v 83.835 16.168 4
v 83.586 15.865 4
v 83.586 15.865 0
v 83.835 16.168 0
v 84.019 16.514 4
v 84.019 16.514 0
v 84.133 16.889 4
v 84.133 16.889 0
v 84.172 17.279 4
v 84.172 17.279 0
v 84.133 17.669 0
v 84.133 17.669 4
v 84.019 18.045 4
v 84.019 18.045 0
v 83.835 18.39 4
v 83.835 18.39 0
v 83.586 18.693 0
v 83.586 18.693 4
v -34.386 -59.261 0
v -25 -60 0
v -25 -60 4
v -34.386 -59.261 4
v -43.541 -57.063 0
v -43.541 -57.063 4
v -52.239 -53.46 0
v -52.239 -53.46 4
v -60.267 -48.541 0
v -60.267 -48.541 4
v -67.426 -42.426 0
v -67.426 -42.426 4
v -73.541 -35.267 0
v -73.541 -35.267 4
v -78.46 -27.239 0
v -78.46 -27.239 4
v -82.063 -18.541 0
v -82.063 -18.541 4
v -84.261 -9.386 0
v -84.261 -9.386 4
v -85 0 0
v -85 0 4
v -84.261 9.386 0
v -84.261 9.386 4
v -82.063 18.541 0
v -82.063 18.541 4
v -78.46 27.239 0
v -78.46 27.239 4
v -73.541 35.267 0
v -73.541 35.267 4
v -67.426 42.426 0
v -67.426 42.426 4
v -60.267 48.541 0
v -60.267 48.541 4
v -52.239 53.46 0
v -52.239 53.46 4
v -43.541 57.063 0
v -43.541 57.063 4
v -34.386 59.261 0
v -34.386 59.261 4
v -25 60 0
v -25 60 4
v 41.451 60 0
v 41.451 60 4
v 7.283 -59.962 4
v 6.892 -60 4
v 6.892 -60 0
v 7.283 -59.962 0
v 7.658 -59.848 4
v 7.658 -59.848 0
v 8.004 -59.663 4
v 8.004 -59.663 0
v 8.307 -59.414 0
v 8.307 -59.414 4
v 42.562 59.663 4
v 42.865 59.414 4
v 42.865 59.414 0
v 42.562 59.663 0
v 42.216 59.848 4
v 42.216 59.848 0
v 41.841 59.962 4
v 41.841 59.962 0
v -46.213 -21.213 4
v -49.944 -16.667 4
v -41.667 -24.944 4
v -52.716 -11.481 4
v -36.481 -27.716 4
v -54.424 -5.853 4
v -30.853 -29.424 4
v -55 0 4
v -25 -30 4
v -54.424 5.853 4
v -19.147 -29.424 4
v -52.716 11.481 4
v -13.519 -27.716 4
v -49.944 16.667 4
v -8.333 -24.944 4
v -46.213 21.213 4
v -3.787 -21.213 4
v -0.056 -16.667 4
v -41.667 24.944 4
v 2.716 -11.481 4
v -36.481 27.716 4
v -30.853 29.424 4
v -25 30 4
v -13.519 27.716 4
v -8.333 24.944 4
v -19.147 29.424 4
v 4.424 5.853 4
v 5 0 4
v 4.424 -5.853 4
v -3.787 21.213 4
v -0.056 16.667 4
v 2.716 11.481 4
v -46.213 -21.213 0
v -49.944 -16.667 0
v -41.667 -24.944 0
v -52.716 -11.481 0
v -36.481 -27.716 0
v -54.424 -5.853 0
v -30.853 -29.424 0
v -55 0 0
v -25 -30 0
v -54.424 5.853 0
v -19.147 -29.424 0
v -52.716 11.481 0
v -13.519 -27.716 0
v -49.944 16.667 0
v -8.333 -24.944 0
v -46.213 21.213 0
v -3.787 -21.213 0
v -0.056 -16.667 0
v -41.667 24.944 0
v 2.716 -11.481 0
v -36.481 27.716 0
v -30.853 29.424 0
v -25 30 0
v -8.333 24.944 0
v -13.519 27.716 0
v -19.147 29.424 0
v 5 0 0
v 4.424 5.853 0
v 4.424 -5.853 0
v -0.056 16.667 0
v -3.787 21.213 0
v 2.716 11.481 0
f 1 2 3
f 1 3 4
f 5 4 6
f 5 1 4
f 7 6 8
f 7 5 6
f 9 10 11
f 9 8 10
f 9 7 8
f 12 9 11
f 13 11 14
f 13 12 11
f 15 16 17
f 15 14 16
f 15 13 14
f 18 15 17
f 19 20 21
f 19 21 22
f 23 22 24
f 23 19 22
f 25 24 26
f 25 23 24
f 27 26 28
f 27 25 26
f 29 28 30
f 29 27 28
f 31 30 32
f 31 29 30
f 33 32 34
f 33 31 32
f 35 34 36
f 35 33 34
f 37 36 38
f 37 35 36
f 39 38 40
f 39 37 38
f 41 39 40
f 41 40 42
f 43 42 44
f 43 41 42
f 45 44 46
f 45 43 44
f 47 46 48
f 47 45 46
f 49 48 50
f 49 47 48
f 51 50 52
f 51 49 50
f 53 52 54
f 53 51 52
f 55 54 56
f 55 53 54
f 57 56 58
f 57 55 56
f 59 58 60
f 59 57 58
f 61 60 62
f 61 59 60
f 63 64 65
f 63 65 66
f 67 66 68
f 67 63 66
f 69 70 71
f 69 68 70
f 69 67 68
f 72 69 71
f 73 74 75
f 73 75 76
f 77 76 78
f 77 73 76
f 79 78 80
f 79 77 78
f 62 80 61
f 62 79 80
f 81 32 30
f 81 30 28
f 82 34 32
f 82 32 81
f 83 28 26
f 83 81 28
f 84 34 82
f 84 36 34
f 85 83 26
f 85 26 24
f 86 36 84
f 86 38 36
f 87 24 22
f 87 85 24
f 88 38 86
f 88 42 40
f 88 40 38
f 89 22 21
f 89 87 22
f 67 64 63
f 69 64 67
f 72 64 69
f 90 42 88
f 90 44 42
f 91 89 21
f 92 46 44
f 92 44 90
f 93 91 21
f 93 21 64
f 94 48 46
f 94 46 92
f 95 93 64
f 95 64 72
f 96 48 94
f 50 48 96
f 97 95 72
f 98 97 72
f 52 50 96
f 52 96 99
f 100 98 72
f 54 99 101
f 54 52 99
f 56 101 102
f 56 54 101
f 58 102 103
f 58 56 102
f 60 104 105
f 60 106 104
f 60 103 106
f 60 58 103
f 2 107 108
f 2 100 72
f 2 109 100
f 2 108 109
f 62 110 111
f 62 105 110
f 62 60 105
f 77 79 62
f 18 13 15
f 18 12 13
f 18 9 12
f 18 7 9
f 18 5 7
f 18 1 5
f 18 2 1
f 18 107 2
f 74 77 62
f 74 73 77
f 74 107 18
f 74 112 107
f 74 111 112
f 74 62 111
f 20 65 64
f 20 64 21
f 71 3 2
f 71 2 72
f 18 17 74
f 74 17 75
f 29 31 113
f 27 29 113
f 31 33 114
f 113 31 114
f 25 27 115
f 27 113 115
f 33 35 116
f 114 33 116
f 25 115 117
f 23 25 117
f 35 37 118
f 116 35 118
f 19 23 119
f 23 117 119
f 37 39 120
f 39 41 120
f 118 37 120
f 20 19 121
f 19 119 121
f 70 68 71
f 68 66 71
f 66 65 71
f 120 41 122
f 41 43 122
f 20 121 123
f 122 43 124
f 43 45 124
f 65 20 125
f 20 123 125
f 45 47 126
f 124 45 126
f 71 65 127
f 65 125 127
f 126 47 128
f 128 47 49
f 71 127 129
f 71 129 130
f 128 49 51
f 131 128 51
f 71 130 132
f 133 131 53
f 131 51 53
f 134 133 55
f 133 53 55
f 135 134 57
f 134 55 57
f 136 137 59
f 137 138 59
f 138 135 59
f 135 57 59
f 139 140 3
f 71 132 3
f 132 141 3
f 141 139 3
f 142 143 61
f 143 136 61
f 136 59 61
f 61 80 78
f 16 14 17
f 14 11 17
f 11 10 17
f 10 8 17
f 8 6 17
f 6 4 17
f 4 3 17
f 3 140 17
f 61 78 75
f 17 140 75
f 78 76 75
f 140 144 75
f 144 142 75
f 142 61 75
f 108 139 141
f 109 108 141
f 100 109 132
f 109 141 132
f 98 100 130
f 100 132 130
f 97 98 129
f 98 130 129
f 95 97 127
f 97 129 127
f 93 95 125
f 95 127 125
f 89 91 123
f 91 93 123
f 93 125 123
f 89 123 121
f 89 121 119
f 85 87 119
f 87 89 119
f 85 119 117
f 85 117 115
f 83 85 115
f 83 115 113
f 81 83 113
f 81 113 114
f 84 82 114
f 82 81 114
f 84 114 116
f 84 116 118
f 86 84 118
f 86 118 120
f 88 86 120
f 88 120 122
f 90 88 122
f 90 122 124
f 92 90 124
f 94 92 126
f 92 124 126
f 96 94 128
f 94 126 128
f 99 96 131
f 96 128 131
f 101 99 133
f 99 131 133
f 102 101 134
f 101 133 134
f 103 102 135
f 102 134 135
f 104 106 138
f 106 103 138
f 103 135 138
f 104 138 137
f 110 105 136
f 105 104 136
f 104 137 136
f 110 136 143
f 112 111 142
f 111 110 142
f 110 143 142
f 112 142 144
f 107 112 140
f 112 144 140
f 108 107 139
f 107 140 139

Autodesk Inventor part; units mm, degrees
ref_plane "YZ Plane" through (0, 0, 0) normal (1, 0, 0) x (0, 1, 0)
ref_plane "XZ Plane" through (0, 0, 0) normal (0, 1, 0) x (-1, 0, 0)
ref_plane "XY Plane" through (0, 0, 0) normal (0, 0, 1) x (1, 0, 0)
sketch "Sketch1" plane through (0, 0, 0) normal (0, 0, 1) x (1, 0, 0)
  line L0 (-85, 60) -> (85, 60)
  line L1 (85, 60) -> (85, -60)
  line L2 (85, -60) -> (-85, -60)
  line L3 (-85, -60) -> (-85, 60)
  line L4 (-85, 60) -> (85, -60) construction
  line L5 (85, 60) -> (-85, -60) construction
  circle A0 centre (-25, 0) radius 30
  line L6 (0, 60) -> (0, -60) construction
  arc A1 (-25, 60) -> (-25, -60) centre (-25, 0) ccw
  line L7 (85, 17.2792) -> (7.7208, -60)
  line L8 (85, 17.2792) -> (42.2792, 60)
  point P0 (0, 0)
  point P1 (-85, 0)
  dimension "d0" = 170
  dimension "d1" = 120
  dimension "d13" = 60
  dimension "d14" = 60
  dimension "d17" = 45
  dimension "d18" = 90
extrude "Plate1" add sketch "Sketch1" along normal blind 4 contours L0 L8 L7 L2 A1
fillet "Corner Round1" radius 2 3 edges at (85, 17.2792, 2) (42.2792, 60, 2) (7.7208, -60, 2)
equation "\"d2\" = Thickness"
equation "\"BendRadius\" = Thickness"
equation "\"BendReliefWidth\" = Thickness"
equation "\"BendReliefDepth\" = 0.5 * Thickness"
equation "\"CornerReliefSize\" = 4 * Thickness"
equation "\"MinimumRemnant\" = 2 * Thickness"
equation "\"TransitionRadius\" = BendRadius"
equation "\"JacobiRadiusSize\" = BendRadius"
equation "\"GapSize\" = Thickness"
equation "\"Thickness\" = 4"
properties part number "ухо"
